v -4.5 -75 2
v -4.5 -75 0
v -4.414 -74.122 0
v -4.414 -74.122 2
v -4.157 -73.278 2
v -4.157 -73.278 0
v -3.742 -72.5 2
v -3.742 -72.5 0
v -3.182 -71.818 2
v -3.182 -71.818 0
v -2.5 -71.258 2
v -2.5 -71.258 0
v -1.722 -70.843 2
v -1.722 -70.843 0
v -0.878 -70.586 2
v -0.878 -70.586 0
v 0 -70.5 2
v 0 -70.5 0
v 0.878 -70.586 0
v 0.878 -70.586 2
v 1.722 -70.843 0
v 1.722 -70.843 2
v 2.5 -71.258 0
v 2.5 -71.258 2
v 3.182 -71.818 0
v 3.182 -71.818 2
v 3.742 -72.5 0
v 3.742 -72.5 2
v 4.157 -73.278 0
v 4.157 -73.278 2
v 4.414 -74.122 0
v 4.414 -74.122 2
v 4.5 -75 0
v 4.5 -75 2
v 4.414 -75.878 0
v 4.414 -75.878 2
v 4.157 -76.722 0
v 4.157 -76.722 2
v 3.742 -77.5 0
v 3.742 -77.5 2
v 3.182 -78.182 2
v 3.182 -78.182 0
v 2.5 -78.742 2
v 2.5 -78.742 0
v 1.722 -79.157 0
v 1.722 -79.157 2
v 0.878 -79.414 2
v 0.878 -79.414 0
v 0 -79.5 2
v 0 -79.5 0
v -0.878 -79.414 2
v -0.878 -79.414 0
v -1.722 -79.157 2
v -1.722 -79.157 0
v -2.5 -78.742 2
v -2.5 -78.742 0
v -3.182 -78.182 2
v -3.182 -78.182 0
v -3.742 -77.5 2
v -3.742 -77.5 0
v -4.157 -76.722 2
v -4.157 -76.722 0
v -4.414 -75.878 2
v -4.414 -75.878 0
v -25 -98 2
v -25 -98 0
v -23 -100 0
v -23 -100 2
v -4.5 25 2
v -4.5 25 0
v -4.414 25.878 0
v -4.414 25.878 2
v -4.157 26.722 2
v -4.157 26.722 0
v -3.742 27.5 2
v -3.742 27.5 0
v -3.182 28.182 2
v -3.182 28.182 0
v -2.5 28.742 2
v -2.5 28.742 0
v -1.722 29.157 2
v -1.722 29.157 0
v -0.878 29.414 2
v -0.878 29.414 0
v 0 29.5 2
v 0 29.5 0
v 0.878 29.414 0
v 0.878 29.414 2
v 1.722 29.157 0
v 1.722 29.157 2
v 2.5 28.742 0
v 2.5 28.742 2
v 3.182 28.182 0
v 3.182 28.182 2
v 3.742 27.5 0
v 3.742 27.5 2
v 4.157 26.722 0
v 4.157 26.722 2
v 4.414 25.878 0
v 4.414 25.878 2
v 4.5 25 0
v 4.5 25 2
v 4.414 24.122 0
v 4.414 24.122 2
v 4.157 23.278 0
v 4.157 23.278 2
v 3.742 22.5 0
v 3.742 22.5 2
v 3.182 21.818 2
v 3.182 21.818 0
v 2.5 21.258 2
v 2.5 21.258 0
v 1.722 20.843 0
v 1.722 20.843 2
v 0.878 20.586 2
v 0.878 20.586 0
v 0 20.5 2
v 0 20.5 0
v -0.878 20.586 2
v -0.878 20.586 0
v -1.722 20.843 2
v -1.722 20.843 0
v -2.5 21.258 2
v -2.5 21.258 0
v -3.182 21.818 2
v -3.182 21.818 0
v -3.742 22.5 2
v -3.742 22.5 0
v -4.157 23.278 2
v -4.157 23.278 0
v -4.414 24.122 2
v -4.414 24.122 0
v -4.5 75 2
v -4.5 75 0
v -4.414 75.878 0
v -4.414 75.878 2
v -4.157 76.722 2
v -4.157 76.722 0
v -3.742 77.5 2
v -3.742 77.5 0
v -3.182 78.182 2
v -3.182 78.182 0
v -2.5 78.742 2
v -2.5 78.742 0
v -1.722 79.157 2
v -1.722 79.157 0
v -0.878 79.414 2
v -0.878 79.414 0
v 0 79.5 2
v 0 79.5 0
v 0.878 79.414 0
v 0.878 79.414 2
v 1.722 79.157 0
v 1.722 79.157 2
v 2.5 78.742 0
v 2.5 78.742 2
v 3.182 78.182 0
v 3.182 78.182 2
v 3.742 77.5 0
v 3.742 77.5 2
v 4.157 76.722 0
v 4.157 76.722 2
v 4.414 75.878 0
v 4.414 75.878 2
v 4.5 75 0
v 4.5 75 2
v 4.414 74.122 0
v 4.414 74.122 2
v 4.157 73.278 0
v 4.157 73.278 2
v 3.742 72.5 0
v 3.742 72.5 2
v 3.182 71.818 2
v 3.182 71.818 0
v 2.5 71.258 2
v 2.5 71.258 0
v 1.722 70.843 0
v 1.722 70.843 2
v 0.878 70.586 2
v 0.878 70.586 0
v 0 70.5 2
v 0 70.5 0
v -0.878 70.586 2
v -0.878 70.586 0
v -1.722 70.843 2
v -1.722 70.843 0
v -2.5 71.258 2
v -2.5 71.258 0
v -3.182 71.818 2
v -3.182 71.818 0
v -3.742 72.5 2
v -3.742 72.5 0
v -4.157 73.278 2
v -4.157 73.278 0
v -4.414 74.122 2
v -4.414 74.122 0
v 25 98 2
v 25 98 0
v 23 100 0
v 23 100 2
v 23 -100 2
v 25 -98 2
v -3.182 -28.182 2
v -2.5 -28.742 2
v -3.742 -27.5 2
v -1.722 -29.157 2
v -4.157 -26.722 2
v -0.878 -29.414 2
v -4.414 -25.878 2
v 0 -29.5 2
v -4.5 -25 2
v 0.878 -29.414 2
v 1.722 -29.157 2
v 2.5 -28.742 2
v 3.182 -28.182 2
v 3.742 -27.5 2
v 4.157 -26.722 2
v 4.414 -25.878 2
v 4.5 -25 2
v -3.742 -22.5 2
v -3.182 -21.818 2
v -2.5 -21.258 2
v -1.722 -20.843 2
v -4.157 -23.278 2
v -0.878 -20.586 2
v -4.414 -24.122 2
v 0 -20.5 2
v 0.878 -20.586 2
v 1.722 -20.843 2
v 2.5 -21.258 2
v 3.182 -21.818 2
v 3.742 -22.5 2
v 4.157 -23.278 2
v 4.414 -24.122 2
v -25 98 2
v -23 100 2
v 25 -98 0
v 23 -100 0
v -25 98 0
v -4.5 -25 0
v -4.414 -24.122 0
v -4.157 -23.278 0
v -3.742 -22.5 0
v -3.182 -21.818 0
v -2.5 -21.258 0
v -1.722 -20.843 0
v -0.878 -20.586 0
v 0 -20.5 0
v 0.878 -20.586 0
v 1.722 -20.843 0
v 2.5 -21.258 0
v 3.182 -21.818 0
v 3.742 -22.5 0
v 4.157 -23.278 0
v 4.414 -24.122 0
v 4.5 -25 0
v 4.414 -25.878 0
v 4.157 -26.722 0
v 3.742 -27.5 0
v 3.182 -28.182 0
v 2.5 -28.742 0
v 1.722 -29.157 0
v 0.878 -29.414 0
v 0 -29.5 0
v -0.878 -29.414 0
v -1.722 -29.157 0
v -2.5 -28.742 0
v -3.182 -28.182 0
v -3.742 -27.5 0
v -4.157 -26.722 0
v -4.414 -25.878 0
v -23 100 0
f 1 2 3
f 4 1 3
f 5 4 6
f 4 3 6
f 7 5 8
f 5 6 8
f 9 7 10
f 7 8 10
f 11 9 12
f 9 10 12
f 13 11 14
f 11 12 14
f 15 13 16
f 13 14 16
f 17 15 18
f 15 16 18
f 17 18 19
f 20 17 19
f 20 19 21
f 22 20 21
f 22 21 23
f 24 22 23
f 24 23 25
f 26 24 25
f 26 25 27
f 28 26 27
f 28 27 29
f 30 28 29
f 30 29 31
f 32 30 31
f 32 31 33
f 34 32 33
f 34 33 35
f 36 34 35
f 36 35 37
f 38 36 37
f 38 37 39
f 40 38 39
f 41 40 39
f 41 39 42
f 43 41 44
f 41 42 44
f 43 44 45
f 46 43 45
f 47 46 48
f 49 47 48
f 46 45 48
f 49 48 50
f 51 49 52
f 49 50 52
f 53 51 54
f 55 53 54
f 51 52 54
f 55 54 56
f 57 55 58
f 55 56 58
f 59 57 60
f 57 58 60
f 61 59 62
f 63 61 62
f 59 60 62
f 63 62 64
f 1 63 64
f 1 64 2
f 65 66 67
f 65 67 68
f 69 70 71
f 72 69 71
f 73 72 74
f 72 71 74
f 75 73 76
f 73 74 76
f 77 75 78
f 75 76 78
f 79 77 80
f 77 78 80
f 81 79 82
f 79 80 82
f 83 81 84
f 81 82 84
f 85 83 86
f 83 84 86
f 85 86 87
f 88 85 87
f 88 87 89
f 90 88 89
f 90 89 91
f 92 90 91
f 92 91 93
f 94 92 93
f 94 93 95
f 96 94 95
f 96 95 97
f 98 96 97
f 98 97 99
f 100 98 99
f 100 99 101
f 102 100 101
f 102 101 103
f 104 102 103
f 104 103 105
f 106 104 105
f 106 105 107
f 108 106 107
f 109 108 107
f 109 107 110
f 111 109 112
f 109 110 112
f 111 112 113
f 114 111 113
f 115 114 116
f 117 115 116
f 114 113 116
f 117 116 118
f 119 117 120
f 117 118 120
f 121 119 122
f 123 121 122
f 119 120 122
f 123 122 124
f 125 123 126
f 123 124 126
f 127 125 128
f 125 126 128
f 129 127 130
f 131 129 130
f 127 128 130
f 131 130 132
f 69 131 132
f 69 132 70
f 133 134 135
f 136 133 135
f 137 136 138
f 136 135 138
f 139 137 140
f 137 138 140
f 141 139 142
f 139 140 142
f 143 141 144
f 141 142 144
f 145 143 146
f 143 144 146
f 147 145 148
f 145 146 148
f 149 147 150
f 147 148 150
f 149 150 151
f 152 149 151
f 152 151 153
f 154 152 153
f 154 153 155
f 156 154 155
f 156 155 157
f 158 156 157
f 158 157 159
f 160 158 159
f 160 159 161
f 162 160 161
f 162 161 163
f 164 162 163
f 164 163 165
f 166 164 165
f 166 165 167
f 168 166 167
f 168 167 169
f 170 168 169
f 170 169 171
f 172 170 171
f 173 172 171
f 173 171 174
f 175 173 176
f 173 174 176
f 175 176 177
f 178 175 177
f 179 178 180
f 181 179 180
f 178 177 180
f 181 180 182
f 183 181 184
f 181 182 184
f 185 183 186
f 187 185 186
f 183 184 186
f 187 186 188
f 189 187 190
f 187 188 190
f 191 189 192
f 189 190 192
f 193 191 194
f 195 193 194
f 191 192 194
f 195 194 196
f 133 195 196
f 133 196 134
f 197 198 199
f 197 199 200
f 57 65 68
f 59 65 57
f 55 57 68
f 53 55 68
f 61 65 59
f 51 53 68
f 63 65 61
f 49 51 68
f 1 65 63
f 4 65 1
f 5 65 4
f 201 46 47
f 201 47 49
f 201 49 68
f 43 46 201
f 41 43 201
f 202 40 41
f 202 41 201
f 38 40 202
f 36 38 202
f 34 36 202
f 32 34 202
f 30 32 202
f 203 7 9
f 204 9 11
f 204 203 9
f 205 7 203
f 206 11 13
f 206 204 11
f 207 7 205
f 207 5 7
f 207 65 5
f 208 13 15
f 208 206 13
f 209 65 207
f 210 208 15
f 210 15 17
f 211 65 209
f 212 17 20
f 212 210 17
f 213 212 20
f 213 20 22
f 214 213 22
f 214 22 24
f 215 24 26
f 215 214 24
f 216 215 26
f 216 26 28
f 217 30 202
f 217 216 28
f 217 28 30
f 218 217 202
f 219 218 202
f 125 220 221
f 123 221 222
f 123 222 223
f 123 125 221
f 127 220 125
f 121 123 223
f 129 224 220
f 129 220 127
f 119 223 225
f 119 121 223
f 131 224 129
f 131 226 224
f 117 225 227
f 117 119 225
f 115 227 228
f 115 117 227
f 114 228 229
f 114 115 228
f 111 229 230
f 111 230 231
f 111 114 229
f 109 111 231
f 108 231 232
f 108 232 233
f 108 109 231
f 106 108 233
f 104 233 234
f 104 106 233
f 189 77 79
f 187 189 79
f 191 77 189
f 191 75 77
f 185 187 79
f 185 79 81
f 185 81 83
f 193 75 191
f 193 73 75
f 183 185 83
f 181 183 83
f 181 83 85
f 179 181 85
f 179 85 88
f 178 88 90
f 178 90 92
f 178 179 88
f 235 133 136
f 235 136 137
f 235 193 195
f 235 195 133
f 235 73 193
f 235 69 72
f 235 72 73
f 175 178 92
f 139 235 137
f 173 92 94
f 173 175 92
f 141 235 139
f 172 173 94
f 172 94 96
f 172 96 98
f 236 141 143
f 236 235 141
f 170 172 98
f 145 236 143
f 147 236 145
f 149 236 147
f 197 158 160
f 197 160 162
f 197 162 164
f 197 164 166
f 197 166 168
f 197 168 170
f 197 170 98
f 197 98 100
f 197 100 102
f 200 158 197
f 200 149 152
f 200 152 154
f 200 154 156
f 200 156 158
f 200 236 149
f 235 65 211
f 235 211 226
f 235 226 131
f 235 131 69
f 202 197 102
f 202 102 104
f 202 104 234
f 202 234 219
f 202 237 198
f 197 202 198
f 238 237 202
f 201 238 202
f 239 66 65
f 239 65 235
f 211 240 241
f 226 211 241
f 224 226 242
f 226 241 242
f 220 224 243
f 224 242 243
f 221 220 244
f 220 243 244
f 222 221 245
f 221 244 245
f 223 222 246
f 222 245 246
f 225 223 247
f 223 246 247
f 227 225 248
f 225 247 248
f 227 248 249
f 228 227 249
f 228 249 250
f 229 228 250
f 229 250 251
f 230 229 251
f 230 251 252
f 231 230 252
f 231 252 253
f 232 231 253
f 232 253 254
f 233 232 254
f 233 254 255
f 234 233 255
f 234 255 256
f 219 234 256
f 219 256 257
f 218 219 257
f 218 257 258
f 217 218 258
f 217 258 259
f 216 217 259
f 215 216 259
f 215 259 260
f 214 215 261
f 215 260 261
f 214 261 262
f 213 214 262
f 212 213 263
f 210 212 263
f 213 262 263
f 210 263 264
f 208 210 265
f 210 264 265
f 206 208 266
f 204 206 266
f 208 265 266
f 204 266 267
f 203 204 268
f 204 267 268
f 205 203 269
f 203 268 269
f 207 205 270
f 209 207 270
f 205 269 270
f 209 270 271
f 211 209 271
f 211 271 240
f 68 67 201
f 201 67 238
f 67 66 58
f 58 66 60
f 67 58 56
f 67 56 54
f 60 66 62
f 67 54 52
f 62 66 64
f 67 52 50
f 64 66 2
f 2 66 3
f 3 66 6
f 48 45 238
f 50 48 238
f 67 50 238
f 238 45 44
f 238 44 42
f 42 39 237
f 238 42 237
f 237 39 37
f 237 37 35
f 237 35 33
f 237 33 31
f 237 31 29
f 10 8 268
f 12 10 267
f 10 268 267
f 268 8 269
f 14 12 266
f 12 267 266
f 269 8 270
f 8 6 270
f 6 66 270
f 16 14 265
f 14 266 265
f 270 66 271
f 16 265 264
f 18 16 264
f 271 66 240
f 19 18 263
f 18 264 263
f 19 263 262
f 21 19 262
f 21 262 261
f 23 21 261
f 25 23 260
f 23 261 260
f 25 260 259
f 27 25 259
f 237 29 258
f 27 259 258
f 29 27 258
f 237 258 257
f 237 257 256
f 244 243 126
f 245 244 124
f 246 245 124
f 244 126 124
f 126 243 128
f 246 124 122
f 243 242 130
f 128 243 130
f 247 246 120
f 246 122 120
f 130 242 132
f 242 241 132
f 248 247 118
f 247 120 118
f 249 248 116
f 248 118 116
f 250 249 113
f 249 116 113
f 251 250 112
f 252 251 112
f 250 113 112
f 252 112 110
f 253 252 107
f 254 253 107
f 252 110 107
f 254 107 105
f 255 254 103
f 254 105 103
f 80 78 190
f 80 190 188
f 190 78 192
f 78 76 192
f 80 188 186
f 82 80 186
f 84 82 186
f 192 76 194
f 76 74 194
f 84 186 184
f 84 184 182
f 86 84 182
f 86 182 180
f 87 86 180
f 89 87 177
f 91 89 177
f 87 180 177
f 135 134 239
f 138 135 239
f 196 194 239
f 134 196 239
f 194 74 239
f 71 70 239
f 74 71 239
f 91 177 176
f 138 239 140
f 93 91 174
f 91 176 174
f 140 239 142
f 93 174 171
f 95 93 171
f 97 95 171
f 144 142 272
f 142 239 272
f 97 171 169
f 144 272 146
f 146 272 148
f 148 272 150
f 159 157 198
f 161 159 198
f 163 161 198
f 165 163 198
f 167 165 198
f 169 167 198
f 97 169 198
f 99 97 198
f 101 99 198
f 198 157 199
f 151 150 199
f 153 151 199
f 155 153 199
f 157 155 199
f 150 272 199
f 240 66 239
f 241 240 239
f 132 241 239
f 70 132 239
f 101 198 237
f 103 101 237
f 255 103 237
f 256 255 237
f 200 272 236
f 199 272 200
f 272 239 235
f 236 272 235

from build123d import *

# Parameters (mm, degrees)
SKETCH_1_W        = 50
SKETCH_1_H        = 200
EXTRUDE_1_DEPTH   = 2
CHAMFER_1_SIZE    = 2
HOLE_WIZARD_M81_D = 9


with BuildPart() as part:
    # Эскиз1 → Бобышка-Вытянуть1 (new body)
    with BuildSketch(Plane.XY):
        Rectangle(SKETCH_1_W, SKETCH_1_H)
    extrude(amount=EXTRUDE_1_DEPTH)

    # Фаска1
    chamfer_1_edges = [part.edges().sort_by_distance(p)[0] for p in [
        (25, -100, 1),
        (-25, -100, 1),
        (-25, 100, 1),
        (25, 100, 1),
    ]]
    chamfer(chamfer_1_edges, length=CHAMFER_1_SIZE)

    # Отверстие с зазором M81 (through all)
    with Locations(Plane.XY.offset(2)):
        with Locations((0, 75), (0, 25), (0, -25), (0, -75)):
            Hole(HOLE_WIZARD_M81_D / 2)


solid = part.part
